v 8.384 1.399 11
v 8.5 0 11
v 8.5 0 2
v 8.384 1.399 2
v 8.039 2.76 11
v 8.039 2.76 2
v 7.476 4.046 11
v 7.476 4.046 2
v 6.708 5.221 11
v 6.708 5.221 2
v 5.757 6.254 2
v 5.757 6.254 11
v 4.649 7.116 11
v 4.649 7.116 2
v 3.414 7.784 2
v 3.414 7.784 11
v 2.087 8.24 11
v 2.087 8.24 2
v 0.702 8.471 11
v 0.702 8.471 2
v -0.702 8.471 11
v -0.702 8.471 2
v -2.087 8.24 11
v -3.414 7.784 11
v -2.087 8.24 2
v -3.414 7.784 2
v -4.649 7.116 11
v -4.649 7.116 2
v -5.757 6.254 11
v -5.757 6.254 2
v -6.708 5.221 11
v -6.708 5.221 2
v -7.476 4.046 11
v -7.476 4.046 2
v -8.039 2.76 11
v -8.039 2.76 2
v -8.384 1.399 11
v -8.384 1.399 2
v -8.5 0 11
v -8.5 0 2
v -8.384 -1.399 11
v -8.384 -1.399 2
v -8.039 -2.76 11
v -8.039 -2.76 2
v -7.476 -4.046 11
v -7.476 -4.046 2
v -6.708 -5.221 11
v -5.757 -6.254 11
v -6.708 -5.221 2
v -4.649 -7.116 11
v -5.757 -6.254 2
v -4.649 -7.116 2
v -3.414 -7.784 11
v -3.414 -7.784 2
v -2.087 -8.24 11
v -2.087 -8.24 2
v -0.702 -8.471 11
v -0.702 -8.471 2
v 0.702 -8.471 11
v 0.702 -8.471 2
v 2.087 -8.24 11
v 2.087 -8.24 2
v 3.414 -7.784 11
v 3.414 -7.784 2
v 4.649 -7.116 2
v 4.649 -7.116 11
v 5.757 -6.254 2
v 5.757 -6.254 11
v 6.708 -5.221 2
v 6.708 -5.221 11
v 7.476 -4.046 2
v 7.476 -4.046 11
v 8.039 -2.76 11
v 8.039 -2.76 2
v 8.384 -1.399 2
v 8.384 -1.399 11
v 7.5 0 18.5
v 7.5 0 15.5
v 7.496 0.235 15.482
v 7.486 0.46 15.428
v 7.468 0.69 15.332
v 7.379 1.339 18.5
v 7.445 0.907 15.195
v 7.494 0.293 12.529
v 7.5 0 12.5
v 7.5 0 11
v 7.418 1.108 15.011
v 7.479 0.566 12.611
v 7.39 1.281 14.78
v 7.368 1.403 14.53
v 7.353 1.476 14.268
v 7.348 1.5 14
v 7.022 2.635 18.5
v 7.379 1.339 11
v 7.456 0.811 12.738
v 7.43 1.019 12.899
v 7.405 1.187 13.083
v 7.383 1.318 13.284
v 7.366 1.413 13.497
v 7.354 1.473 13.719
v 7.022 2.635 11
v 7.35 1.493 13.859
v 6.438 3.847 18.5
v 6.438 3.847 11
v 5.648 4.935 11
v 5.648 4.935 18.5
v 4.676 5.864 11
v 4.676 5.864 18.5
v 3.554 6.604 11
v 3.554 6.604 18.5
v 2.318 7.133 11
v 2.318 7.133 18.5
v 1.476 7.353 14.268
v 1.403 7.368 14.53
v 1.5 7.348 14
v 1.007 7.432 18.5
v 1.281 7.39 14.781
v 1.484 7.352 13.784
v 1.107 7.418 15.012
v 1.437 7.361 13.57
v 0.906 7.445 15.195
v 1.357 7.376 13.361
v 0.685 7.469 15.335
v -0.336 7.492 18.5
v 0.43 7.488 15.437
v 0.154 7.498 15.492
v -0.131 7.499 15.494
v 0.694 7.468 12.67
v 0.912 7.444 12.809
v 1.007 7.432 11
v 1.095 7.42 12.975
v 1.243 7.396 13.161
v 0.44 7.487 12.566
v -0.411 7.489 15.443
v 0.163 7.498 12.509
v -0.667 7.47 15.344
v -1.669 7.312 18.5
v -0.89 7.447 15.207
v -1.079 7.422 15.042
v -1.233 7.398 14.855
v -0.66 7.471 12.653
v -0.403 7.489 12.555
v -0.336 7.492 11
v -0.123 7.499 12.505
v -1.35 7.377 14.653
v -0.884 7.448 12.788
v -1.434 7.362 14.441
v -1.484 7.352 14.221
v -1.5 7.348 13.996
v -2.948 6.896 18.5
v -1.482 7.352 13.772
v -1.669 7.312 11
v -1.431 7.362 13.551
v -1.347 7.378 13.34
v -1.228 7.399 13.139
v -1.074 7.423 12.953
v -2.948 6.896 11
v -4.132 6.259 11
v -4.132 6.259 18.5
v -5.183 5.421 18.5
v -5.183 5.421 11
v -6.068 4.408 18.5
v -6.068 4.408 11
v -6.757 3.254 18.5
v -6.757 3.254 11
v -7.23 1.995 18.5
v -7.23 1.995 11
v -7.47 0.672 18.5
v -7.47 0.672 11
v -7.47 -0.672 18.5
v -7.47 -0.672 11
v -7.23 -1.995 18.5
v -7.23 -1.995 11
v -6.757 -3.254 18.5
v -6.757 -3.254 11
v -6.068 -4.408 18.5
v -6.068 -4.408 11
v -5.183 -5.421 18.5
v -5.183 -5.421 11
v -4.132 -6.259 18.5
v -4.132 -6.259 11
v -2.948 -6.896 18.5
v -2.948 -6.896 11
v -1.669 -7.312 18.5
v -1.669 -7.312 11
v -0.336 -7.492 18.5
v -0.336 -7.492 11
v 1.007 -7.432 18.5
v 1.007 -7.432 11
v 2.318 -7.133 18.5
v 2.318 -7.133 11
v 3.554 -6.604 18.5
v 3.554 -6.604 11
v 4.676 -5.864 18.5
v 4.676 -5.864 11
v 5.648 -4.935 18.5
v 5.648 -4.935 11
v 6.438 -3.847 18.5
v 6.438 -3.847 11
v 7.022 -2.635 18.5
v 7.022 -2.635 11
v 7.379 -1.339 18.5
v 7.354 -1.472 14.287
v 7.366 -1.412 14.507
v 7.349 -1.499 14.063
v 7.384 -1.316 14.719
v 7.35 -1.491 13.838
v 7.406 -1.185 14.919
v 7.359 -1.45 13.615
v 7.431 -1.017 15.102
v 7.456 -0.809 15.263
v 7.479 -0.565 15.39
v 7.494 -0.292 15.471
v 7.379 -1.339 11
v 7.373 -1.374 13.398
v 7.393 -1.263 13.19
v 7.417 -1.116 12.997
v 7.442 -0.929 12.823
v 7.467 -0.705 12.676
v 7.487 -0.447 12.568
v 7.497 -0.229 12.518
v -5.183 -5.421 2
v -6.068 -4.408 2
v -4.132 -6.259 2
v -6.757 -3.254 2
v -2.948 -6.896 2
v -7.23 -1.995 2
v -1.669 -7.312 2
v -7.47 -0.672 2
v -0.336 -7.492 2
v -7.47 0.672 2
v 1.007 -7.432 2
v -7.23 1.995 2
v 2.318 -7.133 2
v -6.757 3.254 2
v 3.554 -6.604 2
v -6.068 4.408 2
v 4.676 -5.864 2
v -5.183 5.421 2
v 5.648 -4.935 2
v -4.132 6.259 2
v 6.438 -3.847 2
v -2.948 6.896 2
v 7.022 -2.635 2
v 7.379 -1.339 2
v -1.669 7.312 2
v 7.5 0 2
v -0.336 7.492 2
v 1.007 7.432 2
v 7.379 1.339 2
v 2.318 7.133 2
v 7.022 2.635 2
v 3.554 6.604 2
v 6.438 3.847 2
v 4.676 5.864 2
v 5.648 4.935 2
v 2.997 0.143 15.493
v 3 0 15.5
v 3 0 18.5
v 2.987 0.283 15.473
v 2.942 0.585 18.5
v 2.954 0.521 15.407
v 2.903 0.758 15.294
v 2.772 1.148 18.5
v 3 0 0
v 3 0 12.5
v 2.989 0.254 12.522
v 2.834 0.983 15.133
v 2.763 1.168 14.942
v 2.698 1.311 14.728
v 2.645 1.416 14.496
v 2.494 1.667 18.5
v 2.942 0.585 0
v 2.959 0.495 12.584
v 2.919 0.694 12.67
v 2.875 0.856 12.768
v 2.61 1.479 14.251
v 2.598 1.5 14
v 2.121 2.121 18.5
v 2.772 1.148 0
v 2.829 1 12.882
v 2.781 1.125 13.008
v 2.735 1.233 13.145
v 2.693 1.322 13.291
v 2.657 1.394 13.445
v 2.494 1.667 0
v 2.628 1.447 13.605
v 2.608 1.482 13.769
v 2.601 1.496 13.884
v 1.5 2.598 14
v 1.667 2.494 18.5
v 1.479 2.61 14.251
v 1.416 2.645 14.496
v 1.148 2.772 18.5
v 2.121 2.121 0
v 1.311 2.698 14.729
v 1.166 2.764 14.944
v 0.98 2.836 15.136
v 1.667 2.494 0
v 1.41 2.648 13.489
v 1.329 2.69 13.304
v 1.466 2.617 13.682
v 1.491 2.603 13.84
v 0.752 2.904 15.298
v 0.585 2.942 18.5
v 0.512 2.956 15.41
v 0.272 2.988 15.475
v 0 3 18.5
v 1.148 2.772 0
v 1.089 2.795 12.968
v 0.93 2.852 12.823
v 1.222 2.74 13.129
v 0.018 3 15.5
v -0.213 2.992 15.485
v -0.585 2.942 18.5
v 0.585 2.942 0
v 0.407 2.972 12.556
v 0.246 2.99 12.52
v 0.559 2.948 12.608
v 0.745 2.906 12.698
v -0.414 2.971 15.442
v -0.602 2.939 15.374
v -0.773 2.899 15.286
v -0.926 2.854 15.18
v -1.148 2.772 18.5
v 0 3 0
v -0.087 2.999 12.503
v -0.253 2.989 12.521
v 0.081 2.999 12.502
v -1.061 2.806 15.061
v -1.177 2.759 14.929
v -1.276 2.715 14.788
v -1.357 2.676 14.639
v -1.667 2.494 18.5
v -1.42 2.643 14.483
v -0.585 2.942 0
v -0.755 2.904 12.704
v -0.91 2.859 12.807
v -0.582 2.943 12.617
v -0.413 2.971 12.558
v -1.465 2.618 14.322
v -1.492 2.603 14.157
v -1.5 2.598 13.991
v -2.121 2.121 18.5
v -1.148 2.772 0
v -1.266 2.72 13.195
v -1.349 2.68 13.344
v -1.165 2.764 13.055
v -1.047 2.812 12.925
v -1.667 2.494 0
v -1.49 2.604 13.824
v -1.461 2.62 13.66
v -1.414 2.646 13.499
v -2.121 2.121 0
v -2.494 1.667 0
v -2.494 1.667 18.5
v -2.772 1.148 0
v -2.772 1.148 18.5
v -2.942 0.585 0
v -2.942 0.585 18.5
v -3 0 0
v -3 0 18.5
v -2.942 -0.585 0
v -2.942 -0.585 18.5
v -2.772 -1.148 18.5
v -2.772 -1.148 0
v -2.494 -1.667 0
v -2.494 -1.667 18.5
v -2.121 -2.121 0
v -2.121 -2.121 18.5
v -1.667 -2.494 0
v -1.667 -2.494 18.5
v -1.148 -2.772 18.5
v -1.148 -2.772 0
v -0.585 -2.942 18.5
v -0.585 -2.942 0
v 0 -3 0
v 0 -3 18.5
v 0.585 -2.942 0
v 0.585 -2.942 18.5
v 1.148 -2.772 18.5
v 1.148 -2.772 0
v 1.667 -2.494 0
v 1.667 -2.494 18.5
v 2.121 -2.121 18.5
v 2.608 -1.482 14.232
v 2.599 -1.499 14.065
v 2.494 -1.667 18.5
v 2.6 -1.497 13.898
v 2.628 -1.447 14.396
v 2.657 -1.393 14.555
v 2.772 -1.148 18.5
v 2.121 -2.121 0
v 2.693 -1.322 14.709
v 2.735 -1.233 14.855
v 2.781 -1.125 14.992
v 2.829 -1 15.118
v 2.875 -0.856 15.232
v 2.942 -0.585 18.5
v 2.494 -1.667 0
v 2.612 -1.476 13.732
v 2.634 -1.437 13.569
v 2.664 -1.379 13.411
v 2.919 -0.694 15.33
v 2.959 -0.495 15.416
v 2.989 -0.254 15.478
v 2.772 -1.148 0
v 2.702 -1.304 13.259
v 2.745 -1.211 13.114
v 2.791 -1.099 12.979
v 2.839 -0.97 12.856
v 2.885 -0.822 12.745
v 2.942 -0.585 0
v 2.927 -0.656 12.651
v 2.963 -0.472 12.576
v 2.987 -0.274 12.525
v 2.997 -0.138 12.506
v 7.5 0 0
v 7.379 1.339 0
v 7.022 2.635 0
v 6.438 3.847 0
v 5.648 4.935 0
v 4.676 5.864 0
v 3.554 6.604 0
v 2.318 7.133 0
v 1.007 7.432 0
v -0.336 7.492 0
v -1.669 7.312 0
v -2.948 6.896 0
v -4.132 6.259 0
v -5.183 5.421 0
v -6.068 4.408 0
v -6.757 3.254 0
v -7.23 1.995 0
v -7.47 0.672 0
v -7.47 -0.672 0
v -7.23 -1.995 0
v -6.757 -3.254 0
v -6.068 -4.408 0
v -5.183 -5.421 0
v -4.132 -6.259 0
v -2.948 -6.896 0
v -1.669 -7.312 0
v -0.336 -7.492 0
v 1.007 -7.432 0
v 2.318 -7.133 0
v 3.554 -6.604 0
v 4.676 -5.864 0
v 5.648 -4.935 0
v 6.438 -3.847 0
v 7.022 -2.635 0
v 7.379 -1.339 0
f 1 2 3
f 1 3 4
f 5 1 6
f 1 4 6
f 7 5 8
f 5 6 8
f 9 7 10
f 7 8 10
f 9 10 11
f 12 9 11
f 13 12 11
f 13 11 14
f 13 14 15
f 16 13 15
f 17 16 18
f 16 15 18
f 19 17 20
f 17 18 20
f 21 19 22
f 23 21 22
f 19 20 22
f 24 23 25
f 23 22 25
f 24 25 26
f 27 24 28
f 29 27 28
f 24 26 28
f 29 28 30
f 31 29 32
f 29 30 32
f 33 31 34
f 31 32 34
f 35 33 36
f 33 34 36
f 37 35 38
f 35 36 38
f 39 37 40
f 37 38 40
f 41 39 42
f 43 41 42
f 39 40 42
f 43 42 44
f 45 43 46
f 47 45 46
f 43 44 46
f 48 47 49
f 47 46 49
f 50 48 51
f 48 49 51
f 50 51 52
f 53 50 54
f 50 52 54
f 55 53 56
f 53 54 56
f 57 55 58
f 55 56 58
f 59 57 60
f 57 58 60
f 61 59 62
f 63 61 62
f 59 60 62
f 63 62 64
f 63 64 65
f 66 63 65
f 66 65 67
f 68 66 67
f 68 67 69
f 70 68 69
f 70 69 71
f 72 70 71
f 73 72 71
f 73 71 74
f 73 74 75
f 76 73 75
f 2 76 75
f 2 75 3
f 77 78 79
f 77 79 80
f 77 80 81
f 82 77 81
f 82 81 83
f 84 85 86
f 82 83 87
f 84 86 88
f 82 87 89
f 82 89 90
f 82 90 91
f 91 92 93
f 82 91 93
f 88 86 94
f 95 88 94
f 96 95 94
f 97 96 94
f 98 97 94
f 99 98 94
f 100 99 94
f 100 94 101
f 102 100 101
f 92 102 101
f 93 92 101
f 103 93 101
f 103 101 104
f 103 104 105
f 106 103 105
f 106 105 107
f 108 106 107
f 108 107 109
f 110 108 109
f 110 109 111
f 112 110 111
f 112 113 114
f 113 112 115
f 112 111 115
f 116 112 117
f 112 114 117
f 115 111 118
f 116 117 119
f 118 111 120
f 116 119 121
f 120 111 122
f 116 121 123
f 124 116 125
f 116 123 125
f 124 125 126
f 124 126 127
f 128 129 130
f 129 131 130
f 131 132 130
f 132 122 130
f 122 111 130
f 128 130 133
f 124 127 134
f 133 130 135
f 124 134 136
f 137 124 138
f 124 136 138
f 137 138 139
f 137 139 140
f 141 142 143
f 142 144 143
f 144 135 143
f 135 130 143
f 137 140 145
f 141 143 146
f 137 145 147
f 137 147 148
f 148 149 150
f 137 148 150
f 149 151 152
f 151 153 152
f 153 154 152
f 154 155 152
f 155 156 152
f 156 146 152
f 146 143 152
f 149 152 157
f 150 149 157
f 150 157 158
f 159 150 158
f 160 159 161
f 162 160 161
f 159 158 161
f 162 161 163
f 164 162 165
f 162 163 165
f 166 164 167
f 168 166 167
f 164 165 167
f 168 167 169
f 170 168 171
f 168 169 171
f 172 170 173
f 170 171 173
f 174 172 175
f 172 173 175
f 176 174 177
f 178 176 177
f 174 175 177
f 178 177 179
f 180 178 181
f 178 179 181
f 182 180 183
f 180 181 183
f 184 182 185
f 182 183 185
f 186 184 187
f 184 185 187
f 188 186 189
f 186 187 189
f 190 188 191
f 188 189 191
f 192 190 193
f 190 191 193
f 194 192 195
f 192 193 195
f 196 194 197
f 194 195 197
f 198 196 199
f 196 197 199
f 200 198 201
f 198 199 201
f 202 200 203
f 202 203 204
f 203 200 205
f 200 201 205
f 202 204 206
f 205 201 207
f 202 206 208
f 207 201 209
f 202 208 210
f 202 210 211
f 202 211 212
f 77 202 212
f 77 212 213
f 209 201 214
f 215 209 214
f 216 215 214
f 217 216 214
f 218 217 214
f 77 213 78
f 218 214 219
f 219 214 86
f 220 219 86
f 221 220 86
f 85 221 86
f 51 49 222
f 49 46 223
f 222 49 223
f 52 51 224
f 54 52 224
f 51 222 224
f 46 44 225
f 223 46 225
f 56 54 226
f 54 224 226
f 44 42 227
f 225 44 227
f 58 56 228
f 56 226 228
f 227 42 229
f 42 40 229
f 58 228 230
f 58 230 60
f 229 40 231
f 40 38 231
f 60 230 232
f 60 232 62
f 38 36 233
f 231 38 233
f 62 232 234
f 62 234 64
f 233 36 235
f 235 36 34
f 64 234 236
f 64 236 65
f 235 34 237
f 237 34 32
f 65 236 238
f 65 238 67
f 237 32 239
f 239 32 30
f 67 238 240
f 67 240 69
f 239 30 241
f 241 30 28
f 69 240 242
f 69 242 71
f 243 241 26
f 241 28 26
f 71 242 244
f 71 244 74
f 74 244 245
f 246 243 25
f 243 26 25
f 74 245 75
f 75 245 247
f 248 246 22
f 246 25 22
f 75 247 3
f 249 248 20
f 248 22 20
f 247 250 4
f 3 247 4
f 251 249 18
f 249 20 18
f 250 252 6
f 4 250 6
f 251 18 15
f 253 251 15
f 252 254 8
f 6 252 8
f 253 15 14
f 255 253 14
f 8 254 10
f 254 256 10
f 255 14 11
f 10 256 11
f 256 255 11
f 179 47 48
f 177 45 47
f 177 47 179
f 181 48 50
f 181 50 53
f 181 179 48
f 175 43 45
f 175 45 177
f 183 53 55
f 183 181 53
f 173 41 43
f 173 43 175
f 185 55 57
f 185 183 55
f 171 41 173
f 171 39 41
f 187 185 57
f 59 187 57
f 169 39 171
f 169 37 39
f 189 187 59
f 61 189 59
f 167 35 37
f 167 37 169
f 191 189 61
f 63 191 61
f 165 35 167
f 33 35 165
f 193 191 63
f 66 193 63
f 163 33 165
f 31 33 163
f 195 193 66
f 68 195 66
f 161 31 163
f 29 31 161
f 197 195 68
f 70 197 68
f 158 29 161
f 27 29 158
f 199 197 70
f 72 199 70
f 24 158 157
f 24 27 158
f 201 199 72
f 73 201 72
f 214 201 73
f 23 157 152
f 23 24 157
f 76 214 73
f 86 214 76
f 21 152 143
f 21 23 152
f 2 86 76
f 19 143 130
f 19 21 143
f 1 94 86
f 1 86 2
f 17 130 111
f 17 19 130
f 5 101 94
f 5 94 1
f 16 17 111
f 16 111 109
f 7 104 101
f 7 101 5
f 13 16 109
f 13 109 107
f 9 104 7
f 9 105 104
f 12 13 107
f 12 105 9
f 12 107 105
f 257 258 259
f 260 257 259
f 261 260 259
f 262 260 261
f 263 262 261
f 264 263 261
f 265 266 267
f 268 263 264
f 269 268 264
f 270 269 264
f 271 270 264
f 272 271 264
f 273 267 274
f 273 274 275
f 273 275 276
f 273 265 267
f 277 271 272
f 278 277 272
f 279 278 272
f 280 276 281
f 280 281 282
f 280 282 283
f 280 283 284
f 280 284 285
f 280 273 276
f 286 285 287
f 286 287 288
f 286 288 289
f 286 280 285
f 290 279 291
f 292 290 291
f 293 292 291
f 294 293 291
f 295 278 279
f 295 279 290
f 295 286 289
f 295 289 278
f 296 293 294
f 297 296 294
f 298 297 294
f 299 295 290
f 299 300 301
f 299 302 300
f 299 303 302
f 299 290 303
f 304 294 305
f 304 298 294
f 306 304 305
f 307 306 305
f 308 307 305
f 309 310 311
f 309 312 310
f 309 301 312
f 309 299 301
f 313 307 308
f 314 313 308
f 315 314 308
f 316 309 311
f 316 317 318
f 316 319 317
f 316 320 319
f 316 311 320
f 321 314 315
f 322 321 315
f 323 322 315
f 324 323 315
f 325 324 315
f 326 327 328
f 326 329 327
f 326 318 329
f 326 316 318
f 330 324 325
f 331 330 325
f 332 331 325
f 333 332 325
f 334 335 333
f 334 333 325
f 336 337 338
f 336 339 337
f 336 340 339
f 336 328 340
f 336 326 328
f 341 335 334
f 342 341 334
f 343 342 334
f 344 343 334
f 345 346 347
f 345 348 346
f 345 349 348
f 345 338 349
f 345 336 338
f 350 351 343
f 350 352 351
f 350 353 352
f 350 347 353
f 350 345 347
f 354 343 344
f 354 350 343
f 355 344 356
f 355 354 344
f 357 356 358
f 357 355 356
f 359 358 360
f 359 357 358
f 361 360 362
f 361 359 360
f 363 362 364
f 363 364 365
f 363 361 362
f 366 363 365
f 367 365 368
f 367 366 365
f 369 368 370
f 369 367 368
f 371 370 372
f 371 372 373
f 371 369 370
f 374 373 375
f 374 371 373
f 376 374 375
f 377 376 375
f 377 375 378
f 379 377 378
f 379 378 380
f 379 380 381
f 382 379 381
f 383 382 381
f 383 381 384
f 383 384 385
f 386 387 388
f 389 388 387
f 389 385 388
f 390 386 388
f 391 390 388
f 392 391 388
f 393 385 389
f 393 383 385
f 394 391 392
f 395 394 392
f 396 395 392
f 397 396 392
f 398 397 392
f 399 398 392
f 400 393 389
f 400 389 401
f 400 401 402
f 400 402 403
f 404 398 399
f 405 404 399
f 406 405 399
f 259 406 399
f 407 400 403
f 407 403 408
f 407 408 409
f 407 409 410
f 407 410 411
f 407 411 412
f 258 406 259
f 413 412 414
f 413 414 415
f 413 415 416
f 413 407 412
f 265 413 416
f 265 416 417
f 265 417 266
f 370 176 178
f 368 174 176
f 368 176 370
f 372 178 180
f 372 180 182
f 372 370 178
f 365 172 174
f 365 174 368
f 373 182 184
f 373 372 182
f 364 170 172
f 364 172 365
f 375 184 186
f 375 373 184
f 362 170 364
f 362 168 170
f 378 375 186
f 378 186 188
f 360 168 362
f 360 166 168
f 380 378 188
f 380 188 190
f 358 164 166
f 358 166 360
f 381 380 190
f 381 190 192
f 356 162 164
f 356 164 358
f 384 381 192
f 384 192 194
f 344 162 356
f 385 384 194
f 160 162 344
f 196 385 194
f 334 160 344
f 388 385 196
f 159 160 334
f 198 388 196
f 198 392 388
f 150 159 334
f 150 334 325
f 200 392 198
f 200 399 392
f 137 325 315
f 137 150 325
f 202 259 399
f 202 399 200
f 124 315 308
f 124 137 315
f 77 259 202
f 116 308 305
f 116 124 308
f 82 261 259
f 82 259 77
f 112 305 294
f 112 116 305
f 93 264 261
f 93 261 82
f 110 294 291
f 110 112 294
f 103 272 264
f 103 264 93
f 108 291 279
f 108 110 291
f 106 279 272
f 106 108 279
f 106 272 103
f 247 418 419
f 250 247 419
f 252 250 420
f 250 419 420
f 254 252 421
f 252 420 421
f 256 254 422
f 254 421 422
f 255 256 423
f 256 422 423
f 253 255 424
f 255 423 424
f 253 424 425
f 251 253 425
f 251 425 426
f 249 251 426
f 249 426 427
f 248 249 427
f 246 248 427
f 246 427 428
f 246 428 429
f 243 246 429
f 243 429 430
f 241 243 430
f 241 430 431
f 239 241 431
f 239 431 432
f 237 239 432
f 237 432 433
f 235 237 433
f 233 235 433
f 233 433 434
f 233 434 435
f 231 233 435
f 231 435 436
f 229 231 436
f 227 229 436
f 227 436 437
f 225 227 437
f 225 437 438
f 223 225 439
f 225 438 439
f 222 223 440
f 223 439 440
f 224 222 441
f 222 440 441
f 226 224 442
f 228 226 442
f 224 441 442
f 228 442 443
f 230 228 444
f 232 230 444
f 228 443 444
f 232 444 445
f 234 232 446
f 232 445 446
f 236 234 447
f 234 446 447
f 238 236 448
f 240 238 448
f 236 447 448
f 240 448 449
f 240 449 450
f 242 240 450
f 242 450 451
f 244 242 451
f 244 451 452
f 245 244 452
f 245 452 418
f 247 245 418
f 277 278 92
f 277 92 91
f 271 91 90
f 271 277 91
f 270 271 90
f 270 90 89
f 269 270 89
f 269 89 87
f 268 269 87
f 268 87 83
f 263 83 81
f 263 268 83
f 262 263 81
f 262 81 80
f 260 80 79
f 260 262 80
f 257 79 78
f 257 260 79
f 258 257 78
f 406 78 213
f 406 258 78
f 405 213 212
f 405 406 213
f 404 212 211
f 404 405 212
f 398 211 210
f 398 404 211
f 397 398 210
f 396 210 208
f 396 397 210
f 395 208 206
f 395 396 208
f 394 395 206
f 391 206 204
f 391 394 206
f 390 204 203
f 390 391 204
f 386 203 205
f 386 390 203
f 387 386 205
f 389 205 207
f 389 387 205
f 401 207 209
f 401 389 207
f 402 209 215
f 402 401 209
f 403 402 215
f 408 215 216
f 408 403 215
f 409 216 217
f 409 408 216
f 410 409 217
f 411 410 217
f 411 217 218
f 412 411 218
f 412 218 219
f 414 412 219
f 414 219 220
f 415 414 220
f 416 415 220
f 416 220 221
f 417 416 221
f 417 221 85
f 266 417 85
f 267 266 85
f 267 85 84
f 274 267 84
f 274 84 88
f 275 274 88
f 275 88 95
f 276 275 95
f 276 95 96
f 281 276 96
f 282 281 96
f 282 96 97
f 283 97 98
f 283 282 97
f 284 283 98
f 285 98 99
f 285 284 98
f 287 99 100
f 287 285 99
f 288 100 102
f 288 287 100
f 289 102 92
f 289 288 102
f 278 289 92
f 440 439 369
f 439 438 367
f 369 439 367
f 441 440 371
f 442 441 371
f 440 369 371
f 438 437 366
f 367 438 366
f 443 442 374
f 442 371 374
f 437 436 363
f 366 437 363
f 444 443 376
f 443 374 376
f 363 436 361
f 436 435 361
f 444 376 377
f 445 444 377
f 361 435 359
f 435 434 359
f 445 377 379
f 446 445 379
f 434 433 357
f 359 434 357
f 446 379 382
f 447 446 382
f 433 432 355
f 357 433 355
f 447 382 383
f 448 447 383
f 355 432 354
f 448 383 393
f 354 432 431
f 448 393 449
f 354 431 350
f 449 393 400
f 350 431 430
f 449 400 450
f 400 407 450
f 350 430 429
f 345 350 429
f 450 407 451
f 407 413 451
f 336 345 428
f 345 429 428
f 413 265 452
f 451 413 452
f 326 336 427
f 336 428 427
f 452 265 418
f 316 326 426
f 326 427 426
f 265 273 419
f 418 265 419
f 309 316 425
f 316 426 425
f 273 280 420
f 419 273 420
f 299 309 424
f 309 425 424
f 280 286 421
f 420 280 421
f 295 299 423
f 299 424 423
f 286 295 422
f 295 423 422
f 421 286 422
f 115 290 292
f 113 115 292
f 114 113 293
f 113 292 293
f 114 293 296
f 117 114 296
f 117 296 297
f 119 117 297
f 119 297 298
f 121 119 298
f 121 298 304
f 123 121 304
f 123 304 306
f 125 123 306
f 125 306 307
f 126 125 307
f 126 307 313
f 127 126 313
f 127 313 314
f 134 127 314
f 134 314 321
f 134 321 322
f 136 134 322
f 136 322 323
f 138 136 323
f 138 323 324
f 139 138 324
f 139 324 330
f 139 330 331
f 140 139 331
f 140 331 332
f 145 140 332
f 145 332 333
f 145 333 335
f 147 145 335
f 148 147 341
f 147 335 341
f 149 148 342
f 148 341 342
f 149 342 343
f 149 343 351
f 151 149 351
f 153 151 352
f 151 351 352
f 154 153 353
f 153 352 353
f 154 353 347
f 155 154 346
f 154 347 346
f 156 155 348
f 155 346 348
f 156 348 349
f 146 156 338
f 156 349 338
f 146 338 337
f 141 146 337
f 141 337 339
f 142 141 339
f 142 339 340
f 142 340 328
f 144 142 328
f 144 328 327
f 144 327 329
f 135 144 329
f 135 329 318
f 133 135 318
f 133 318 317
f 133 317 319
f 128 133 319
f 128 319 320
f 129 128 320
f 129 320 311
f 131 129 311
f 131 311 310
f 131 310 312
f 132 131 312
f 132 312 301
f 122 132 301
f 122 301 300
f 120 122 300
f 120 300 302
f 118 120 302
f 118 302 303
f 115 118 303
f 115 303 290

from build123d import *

# Parameters (mm, degrees)
F0_R     = 7.5
F0_R_2   = 3
F1_DEPTH = 18.5
F2_START = 2
F0_R_3   = 8.5
F2_DEPTH = 9
F3_R     = 1.5
F4_DEPTH = 8.501
F5_R     = 1.5
F6_DEPTH = 8.501


with BuildPart() as f1:
    # F0 (on Top) → F1 (new body)
    with BuildSketch(Plane.XY):
        Circle(F0_R)
        Circle(F0_R_2, mode=Mode.SUBTRACT)
    extrude(amount=F1_DEPTH)

    # F0 (on Top) → F2 (join)
    with BuildSketch(Plane.XY.offset(F2_START)):
        Circle(F0_R_3)
        Circle(F0_R, mode=Mode.SUBTRACT)
    extrude(amount=F2_DEPTH)

    # F3 (on Right) → F4 (cut, through all)
    with BuildSketch(Plane.YZ):
        with Locations((0, 14)):
            Circle(F3_R)
    extrude(amount=F4_DEPTH, mode=Mode.SUBTRACT)

    # F5 (on Front) → F6 (cut, through all)
    with BuildSketch(Plane.XZ):
        with Locations((0, 14)):
            Circle(F5_R)
    extrude(amount=-F6_DEPTH, mode=Mode.SUBTRACT)


solid = f1.part
